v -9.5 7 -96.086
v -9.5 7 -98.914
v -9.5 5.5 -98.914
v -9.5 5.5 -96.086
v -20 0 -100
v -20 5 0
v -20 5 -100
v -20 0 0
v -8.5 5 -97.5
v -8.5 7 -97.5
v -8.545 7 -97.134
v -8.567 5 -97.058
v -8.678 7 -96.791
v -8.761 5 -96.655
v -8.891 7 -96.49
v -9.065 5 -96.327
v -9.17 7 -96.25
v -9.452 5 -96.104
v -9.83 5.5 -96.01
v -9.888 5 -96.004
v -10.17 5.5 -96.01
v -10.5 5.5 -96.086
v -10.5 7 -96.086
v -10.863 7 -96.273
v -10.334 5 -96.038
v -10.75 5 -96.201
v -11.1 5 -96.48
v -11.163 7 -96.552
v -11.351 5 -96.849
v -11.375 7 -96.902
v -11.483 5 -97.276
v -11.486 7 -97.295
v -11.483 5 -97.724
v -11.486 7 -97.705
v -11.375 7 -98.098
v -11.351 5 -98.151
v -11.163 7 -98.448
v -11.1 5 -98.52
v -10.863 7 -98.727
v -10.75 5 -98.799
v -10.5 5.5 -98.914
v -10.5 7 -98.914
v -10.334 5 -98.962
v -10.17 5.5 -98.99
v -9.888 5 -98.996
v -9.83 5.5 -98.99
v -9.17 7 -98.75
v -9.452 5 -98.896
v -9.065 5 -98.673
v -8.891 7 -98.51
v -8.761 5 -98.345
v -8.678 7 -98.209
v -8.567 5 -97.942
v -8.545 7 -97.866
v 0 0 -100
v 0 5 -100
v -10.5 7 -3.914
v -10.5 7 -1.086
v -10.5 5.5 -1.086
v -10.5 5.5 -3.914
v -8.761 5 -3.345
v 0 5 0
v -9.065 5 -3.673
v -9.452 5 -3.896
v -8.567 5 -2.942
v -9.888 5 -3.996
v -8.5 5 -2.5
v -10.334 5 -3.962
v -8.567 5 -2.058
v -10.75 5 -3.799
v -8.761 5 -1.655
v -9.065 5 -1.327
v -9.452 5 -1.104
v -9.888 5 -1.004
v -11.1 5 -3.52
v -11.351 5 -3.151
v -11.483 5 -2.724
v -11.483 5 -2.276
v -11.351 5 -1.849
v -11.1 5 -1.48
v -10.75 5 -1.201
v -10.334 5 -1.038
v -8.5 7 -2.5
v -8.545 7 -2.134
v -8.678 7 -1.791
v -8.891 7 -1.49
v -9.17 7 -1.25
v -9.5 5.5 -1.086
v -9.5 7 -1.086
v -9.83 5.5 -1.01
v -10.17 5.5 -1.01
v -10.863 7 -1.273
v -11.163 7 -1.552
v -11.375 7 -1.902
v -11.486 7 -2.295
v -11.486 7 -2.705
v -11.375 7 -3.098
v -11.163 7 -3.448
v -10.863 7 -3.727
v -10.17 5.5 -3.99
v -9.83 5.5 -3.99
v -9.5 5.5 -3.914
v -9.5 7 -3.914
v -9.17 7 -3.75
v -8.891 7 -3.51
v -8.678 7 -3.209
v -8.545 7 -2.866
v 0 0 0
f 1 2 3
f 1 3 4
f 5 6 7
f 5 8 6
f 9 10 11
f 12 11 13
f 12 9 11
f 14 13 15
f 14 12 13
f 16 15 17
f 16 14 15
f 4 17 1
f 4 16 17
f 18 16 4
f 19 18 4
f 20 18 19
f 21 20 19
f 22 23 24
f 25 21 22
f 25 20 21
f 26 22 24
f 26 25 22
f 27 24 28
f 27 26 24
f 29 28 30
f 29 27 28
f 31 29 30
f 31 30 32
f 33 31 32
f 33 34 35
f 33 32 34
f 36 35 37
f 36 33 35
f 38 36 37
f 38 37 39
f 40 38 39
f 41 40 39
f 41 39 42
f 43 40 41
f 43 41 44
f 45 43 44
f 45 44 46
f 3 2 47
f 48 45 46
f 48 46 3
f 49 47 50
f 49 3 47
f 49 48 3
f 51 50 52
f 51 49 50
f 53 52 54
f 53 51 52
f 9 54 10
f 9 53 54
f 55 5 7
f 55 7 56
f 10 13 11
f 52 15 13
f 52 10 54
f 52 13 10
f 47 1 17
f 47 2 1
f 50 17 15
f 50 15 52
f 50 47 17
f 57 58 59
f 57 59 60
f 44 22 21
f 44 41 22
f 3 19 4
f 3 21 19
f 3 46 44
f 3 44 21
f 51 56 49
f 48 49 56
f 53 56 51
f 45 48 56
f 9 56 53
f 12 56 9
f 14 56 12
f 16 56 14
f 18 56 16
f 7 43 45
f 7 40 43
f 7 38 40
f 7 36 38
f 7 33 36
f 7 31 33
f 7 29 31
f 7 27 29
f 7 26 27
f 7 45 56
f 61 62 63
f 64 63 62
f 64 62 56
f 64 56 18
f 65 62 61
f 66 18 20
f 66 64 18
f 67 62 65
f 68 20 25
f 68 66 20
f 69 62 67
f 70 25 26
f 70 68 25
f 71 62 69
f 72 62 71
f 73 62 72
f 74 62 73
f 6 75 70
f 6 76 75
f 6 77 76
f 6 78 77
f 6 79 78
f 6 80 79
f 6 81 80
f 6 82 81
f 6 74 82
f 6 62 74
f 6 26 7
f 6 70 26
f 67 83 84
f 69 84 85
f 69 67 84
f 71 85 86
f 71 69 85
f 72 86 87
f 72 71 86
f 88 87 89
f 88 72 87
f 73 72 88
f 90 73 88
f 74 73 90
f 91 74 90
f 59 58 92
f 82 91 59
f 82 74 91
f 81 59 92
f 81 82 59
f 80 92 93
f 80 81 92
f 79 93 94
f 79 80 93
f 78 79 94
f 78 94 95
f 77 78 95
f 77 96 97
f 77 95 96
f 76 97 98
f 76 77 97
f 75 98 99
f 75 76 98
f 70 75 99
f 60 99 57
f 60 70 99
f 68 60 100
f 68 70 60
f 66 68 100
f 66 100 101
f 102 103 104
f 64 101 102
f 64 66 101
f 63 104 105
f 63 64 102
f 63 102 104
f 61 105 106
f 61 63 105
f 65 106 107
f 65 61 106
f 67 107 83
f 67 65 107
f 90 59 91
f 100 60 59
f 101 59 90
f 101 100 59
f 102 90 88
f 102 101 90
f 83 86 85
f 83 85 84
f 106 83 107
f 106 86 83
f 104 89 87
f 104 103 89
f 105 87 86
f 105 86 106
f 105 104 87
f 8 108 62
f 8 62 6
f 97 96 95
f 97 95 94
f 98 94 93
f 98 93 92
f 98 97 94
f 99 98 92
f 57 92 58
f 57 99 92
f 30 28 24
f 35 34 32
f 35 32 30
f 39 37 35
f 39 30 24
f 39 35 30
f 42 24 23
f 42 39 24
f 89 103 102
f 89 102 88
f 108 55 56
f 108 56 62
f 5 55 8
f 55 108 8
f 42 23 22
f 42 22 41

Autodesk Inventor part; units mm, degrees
ref_plane "YZ Plane" through (0, 0, 0) normal (1, 0, 0) x (0, 1, 0)
ref_plane "XZ Plane" through (0, 0, 0) normal (0, 1, 0) x (-1, 0, 0)
ref_plane "XY Plane" through (0, 0, 0) normal (0, 0, 1) x (1, 0, 0)
sketch "Sketch1" plane through (0, 0, 0) normal (0, 1, 0) x (-1, 0, 0)
  line L0 (0, 0) -> (20, 0)
  line L1 (20, 0) -> (20, -100)
  line L2 (20, -100) -> (0, -100)
  line L3 (0, -100) -> (0, 0)
  dimension "d0" = 20
  dimension "d1" = 100
extrude "Extrusion1" add sketch "Sketch1" along normal blind 5
sketch "Sketch2" plane through (0, 5, 0) normal (0, 1, 0) x (1, 0, 0)
  point P0 (0, 0)
sketch "Sketch3" plane through (0, 5, 0) normal (0, 1, 0) x (1, 0, 0)
  point P0 (0, 0)
sketch "Sketch4" plane through (0, 5, 0) normal (0, 1, 0) x (1, 0, 0)
  point P0 (0, 0)
sketch "Sketch5" plane through (0, 5, 0) normal (0, 1, 0) x (1, 0, 0)
  point P0 (0, 0)
sketch "Sketch6" plane through (0, 5, 0) normal (0, 1, 0) x (1, 0, 0)
  circle A0 centre (-10, 2.5) radius 1.5
  point P0 (0, 0)
  dimension "d4" = 3
extrude "Extrusion2" add sketch "Sketch6" along normal blind 2
sketch "Sketch7" plane through (-10, 7, -2.5) normal (0, 1, 0) x (1, 0, 0)
  line L0 (-0.5, 1.5) -> (0.5, 1.5)
  line L1 (0.5, 1.5) -> (0.5, -1.5)
  line L2 (0.5, -1.5) -> (-0.5, -1.5)
  line L3 (-0.5, -1.5) -> (-0.5, 1.5)
  line L4 (-0.5, 1.5) -> (0.5, -1.5) construction
  line L5 (0.5, 1.5) -> (-0.5, -1.5) construction
  point P0 (10, -2.5)
  point P1 (0, 0)
  dimension "d7" = 1
  dimension "d8" = 3
extrude "Extrusion3" cut sketch "Sketch7" against normal blind 1.5
pattern_linear "Rectangular Pattern1" count 2 spacing 95 along (0, 0, -1) of "Extrusion2", "Extrusion3"
properties material "LCP Plastic"
